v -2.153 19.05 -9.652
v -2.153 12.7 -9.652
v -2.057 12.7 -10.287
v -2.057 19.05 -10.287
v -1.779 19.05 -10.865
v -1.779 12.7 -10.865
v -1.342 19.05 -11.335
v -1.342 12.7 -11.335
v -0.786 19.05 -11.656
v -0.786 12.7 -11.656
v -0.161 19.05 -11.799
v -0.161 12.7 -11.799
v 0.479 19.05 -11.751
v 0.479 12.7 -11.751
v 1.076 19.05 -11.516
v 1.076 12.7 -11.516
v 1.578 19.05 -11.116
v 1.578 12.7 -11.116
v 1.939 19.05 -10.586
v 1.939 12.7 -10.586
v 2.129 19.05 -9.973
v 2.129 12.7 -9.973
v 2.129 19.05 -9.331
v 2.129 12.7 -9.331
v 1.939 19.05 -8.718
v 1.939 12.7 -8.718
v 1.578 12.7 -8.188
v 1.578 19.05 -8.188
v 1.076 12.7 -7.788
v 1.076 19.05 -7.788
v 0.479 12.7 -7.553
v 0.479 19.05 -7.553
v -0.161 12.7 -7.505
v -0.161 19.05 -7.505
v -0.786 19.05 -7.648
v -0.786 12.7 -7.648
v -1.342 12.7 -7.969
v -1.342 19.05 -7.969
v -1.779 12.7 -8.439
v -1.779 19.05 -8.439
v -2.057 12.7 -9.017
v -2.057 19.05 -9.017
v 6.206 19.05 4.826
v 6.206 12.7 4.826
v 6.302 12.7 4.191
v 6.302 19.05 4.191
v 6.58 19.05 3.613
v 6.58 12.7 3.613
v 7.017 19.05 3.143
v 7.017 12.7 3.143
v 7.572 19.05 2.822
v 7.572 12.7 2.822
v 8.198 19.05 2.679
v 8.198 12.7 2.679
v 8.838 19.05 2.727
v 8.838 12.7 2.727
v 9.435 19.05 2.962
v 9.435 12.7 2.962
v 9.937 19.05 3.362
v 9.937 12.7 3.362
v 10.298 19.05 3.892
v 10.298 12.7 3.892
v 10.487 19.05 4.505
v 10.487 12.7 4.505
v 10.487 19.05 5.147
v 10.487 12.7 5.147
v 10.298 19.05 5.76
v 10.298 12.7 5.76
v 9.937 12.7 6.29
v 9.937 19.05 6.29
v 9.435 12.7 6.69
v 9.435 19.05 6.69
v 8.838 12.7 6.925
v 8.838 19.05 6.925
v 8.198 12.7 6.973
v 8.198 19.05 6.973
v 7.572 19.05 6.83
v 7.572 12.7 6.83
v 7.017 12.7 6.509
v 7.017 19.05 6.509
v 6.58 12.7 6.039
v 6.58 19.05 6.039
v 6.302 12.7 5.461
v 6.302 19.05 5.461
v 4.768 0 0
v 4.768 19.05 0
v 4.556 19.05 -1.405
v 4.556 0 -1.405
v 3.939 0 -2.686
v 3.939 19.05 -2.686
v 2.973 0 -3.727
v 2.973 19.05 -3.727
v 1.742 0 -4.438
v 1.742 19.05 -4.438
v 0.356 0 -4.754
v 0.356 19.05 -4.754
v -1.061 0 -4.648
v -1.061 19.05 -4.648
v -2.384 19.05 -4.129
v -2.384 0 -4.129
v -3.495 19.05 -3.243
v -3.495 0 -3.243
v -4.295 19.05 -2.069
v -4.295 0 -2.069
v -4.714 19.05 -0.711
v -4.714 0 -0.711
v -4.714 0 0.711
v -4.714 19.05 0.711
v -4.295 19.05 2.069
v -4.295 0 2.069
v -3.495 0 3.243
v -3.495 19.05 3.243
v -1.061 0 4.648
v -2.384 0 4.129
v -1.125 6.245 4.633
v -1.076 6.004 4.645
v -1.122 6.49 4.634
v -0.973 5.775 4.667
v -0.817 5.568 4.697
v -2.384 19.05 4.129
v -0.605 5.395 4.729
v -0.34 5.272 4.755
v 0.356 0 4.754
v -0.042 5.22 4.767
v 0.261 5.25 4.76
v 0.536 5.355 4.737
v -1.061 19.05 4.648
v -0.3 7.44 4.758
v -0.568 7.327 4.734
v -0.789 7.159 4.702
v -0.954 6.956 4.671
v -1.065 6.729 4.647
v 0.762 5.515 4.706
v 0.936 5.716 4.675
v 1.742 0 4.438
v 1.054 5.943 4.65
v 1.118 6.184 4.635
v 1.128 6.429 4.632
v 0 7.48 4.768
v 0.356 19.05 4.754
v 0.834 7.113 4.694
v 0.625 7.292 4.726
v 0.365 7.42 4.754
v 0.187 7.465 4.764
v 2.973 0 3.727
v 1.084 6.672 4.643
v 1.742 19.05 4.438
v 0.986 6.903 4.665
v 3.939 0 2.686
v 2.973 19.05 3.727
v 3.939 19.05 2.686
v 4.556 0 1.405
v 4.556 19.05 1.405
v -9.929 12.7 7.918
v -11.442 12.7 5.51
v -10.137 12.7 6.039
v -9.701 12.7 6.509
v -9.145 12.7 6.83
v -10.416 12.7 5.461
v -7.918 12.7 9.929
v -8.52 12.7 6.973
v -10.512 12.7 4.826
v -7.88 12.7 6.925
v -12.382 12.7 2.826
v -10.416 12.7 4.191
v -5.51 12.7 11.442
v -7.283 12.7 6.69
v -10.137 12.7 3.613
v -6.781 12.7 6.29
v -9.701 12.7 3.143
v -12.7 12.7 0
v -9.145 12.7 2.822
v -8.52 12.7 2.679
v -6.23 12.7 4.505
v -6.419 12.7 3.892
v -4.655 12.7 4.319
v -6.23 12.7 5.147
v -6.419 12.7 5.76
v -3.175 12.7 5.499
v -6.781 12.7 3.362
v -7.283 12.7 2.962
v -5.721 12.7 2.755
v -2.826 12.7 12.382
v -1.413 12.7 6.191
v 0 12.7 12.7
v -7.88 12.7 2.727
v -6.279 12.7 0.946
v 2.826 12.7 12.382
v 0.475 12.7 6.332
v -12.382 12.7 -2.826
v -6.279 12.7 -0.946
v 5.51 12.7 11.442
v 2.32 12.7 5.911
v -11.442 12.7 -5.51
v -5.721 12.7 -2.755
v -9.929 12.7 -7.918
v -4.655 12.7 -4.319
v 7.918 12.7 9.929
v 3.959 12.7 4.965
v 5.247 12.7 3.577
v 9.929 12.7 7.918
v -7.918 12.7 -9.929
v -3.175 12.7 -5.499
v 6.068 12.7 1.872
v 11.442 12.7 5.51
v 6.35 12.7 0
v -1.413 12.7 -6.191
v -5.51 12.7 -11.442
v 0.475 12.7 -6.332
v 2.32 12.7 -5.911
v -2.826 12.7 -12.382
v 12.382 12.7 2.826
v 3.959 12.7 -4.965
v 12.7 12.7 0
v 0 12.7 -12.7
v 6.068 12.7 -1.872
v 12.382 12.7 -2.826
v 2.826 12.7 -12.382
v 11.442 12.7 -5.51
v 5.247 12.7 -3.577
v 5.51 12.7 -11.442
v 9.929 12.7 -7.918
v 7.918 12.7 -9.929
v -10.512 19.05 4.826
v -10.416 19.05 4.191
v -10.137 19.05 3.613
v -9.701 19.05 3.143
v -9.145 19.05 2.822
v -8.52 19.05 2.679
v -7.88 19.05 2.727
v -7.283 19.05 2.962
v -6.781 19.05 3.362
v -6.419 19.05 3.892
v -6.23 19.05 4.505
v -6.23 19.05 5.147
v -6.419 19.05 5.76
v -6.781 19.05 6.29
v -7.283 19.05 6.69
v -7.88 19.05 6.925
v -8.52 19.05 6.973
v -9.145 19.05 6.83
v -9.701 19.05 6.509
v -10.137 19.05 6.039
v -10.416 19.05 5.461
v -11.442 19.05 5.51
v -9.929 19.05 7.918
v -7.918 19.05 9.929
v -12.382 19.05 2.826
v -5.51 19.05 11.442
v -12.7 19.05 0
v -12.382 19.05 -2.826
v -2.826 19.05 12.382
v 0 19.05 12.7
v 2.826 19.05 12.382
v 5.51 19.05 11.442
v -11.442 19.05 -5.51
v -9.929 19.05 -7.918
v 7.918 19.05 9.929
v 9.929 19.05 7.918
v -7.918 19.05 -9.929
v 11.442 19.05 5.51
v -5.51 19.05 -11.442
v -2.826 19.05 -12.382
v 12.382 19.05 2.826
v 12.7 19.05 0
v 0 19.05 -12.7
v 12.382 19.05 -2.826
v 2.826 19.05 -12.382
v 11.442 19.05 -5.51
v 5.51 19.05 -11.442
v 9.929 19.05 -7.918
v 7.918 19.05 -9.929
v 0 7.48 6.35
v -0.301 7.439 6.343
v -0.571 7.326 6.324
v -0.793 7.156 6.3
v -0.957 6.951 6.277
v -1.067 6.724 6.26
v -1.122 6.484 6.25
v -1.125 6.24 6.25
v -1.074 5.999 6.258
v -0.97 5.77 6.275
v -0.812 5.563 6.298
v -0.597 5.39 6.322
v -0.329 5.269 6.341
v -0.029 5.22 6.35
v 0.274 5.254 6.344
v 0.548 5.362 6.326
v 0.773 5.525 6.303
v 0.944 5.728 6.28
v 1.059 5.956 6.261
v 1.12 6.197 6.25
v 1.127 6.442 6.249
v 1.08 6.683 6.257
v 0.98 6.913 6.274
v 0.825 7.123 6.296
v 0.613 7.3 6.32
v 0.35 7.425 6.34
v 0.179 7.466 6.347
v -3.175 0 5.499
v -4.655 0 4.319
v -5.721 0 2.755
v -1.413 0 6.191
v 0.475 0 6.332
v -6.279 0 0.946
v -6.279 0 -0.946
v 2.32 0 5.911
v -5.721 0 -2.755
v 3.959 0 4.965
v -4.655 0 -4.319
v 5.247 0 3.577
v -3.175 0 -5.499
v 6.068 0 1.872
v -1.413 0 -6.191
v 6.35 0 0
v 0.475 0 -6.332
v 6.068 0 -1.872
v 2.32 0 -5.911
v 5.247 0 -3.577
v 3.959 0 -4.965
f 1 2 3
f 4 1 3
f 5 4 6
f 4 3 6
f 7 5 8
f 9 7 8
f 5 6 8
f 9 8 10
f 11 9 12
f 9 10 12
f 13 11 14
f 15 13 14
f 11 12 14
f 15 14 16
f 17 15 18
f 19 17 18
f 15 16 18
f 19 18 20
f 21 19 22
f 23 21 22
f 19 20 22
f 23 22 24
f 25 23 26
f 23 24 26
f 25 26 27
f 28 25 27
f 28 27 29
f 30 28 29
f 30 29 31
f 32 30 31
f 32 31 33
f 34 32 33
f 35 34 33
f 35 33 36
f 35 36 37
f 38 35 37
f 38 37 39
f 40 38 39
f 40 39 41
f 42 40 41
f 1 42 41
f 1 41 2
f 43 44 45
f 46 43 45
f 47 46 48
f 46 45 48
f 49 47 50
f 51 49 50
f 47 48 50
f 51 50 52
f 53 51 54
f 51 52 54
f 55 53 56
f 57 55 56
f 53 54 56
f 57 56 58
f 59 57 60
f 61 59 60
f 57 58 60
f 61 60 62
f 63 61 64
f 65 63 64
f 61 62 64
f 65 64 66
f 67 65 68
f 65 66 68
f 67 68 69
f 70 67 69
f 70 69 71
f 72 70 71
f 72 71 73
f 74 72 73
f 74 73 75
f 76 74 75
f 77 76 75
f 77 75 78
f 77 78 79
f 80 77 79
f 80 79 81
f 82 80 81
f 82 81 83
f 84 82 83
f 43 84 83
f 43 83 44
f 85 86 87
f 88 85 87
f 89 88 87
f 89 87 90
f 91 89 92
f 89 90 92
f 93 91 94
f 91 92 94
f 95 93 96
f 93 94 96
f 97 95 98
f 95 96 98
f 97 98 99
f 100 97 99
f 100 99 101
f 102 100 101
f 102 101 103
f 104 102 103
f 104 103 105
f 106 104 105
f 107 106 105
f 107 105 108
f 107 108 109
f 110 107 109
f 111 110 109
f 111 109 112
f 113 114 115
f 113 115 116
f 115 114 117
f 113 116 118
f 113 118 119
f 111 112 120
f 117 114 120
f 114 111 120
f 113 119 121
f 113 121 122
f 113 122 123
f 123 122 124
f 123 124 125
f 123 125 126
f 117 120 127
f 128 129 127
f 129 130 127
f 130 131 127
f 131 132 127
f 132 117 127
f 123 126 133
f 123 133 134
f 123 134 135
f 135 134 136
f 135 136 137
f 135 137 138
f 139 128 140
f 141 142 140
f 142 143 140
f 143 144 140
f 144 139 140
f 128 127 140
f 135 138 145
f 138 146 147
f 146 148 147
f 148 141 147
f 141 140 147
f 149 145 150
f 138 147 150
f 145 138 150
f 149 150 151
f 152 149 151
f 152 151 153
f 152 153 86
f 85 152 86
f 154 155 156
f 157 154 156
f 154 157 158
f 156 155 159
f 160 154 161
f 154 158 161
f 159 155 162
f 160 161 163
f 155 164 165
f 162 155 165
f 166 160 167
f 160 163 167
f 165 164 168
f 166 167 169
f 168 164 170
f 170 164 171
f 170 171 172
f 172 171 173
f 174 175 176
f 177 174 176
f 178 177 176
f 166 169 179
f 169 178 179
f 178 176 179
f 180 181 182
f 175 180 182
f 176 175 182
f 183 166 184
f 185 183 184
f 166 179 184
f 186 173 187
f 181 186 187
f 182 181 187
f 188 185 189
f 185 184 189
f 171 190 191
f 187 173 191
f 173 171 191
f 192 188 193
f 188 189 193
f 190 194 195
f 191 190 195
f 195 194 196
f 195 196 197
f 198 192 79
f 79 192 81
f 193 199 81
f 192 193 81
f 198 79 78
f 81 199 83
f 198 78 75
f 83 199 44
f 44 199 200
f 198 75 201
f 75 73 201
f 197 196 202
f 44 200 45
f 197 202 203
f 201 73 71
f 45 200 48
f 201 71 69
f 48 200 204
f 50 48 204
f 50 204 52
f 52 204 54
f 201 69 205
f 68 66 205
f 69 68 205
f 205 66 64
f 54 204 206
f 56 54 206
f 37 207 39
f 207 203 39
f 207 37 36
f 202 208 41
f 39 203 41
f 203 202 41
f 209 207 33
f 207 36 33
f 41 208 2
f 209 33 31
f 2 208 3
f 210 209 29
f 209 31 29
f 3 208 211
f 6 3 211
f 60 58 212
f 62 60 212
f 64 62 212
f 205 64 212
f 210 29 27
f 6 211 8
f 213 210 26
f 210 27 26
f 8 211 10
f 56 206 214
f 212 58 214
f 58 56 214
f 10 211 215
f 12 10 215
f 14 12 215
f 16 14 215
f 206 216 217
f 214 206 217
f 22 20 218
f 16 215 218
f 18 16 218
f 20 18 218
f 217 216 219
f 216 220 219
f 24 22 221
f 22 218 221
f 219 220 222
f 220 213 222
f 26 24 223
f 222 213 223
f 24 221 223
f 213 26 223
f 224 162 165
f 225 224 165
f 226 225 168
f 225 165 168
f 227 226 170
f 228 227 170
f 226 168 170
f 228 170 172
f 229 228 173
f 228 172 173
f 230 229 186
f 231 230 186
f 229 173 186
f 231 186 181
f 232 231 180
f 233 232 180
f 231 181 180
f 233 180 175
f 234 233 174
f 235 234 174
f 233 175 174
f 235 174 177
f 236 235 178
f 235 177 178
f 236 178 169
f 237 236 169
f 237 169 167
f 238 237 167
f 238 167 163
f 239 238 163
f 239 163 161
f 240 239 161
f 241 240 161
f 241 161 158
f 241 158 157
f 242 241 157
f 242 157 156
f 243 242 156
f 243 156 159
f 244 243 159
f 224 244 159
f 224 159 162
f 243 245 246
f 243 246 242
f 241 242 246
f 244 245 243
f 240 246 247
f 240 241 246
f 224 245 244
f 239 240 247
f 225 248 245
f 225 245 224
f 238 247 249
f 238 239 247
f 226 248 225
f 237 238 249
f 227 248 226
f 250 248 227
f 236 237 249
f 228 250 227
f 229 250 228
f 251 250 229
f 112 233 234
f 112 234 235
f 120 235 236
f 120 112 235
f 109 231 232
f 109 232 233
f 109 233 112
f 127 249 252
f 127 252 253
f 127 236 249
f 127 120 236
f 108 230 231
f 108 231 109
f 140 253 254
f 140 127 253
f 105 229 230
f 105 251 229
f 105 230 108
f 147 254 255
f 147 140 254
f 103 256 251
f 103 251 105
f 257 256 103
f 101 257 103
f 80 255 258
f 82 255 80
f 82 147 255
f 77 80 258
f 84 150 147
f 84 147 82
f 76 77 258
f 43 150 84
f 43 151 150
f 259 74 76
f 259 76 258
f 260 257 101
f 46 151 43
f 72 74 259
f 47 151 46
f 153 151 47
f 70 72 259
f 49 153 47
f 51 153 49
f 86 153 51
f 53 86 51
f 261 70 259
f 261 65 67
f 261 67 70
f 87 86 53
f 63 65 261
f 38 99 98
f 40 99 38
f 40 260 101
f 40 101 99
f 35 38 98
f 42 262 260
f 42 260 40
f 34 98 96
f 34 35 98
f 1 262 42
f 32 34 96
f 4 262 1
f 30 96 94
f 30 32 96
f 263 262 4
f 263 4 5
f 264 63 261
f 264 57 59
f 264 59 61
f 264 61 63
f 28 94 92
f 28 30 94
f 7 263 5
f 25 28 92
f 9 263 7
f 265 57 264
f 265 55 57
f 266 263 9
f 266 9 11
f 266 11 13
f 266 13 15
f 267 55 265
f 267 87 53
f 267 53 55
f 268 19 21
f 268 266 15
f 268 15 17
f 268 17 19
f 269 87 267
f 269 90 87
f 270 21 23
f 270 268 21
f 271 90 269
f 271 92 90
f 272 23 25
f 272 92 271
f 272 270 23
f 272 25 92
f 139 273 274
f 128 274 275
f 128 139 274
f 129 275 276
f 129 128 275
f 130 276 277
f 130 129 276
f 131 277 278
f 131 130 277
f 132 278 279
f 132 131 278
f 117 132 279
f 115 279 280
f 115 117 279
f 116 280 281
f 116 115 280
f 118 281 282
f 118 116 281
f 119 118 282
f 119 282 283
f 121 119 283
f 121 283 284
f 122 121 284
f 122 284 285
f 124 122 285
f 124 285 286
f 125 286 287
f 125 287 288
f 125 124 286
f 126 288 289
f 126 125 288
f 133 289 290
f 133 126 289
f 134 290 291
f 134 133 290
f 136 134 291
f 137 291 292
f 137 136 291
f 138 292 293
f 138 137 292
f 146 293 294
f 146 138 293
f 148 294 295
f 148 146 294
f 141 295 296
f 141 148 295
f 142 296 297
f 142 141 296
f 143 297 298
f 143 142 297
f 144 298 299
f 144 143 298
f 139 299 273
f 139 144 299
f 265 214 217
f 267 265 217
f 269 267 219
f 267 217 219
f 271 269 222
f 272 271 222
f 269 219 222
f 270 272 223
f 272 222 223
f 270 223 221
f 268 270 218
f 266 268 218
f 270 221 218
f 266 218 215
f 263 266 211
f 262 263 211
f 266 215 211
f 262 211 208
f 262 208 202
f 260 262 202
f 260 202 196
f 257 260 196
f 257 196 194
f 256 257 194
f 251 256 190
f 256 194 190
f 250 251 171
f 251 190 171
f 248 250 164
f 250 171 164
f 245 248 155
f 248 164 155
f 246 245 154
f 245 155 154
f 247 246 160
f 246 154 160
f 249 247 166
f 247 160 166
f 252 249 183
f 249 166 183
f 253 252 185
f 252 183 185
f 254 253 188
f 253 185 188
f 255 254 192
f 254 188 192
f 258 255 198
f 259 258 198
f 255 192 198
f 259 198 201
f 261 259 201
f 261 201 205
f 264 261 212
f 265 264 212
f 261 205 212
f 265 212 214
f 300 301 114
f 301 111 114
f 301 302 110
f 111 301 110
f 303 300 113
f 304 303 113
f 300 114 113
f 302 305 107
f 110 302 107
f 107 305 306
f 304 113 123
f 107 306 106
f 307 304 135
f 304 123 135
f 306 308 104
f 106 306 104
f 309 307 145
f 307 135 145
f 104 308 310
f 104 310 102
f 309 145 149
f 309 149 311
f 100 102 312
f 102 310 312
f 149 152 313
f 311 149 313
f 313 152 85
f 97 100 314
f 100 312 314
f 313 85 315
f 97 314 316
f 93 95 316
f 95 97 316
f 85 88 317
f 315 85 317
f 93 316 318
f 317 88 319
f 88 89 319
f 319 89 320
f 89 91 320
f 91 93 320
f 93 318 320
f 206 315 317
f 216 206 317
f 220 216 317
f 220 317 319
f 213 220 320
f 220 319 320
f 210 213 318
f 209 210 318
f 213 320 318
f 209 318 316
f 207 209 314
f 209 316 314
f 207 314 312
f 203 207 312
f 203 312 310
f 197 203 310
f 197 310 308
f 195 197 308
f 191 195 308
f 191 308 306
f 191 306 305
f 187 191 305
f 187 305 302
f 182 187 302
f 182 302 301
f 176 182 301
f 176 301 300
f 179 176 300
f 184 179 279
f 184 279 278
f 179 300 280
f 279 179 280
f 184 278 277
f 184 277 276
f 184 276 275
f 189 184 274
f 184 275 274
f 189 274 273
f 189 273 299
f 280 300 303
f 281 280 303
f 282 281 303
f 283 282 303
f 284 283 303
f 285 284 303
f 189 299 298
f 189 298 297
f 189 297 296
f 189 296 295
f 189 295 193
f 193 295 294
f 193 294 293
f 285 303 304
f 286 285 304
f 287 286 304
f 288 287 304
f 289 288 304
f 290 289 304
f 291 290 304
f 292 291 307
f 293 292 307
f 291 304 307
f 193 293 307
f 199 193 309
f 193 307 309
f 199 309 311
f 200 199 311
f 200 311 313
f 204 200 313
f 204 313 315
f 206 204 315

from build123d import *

# Parameters (mm, degrees)
SKETCH1_R                        = 6.35
BOSS_EXTRUDE1_DEPTH              = 12.7
SKETCH2_R                        = 12.7
BOSS_EXTRUDE2_DEPTH              = 6.35
SKETCH3_R                        = 4.76758
CUT_EXTRUDE1_DEPTH               = 20.05
F_18_0_1695_DIAMETER_HOLE1_D     = 4.3053
F_18_0_1695_DIAMETER_HOLE1_DEPTH = 25.4
F_18_0_1695_DIAMETER_HOLE1_TIP   = 1.293442612


with BuildPart() as part:
    # Sketch1 → Boss-Extrude1 (new body)
    with BuildSketch(Plane(origin=(0, 0, 0), x_dir=(1, 0, 0), z_dir=(0, 1, 0))):
        Circle(SKETCH1_R)
    extrude(amount=BOSS_EXTRUDE1_DEPTH)

    # Sketch2 → Boss-Extrude2 (add)
    with BuildSketch(Plane(origin=(0, 12.7, 0), x_dir=(1, 0, 0), z_dir=(0, 1, 0))):
        Circle(SKETCH2_R)
    extrude(amount=BOSS_EXTRUDE2_DEPTH)

    # Sketch3 → Cut-Extrude1 (cut, through all)
    with BuildSketch(Plane(origin=(0, 19.05, 0), x_dir=(1, 0, 0), z_dir=(0, 1, 0))):
        Circle(SKETCH3_R)
    extrude(amount=-CUT_EXTRUDE1_DEPTH, mode=Mode.SUBTRACT)

    # #18 (0.1695) Diameter Hole1
    with Locations(Plane(origin=(0, 19.05, 0), x_dir=(1, 0, 0), z_dir=(0, 1, 0))):
        with Locations((0, 9.652), (-8.358877197, -4.826), (8.358877197, -4.826)):
            Hole(F_18_0_1695_DIAMETER_HOLE1_D / 2, depth=F_18_0_1695_DIAMETER_HOLE1_DEPTH)
            with Locations((0, 0, -(F_18_0_1695_DIAMETER_HOLE1_DEPTH + F_18_0_1695_DIAMETER_HOLE1_TIP / 2))):  # 118° drill point
                Cone(0, F_18_0_1695_DIAMETER_HOLE1_D / 2, F_18_0_1695_DIAMETER_HOLE1_TIP, mode=Mode.SUBTRACT)

    # Sketch8 → #43 (0.089) Diameter Hole1 (revolve, cut)
    with BuildSketch(Plane(origin=(0, 6.35, 0), x_dir=(0, 1, 0), z_dir=(1, 0, 0))):
        Polygon((0, 0), (0, 26.079152758), (1.1303, 25.4), (1.1303, 0), align=None)
    revolve(axis=Axis((0, 6.35, -6.35), (0, 0, 1)), mode=Mode.SUBTRACT)


solid = part.part
